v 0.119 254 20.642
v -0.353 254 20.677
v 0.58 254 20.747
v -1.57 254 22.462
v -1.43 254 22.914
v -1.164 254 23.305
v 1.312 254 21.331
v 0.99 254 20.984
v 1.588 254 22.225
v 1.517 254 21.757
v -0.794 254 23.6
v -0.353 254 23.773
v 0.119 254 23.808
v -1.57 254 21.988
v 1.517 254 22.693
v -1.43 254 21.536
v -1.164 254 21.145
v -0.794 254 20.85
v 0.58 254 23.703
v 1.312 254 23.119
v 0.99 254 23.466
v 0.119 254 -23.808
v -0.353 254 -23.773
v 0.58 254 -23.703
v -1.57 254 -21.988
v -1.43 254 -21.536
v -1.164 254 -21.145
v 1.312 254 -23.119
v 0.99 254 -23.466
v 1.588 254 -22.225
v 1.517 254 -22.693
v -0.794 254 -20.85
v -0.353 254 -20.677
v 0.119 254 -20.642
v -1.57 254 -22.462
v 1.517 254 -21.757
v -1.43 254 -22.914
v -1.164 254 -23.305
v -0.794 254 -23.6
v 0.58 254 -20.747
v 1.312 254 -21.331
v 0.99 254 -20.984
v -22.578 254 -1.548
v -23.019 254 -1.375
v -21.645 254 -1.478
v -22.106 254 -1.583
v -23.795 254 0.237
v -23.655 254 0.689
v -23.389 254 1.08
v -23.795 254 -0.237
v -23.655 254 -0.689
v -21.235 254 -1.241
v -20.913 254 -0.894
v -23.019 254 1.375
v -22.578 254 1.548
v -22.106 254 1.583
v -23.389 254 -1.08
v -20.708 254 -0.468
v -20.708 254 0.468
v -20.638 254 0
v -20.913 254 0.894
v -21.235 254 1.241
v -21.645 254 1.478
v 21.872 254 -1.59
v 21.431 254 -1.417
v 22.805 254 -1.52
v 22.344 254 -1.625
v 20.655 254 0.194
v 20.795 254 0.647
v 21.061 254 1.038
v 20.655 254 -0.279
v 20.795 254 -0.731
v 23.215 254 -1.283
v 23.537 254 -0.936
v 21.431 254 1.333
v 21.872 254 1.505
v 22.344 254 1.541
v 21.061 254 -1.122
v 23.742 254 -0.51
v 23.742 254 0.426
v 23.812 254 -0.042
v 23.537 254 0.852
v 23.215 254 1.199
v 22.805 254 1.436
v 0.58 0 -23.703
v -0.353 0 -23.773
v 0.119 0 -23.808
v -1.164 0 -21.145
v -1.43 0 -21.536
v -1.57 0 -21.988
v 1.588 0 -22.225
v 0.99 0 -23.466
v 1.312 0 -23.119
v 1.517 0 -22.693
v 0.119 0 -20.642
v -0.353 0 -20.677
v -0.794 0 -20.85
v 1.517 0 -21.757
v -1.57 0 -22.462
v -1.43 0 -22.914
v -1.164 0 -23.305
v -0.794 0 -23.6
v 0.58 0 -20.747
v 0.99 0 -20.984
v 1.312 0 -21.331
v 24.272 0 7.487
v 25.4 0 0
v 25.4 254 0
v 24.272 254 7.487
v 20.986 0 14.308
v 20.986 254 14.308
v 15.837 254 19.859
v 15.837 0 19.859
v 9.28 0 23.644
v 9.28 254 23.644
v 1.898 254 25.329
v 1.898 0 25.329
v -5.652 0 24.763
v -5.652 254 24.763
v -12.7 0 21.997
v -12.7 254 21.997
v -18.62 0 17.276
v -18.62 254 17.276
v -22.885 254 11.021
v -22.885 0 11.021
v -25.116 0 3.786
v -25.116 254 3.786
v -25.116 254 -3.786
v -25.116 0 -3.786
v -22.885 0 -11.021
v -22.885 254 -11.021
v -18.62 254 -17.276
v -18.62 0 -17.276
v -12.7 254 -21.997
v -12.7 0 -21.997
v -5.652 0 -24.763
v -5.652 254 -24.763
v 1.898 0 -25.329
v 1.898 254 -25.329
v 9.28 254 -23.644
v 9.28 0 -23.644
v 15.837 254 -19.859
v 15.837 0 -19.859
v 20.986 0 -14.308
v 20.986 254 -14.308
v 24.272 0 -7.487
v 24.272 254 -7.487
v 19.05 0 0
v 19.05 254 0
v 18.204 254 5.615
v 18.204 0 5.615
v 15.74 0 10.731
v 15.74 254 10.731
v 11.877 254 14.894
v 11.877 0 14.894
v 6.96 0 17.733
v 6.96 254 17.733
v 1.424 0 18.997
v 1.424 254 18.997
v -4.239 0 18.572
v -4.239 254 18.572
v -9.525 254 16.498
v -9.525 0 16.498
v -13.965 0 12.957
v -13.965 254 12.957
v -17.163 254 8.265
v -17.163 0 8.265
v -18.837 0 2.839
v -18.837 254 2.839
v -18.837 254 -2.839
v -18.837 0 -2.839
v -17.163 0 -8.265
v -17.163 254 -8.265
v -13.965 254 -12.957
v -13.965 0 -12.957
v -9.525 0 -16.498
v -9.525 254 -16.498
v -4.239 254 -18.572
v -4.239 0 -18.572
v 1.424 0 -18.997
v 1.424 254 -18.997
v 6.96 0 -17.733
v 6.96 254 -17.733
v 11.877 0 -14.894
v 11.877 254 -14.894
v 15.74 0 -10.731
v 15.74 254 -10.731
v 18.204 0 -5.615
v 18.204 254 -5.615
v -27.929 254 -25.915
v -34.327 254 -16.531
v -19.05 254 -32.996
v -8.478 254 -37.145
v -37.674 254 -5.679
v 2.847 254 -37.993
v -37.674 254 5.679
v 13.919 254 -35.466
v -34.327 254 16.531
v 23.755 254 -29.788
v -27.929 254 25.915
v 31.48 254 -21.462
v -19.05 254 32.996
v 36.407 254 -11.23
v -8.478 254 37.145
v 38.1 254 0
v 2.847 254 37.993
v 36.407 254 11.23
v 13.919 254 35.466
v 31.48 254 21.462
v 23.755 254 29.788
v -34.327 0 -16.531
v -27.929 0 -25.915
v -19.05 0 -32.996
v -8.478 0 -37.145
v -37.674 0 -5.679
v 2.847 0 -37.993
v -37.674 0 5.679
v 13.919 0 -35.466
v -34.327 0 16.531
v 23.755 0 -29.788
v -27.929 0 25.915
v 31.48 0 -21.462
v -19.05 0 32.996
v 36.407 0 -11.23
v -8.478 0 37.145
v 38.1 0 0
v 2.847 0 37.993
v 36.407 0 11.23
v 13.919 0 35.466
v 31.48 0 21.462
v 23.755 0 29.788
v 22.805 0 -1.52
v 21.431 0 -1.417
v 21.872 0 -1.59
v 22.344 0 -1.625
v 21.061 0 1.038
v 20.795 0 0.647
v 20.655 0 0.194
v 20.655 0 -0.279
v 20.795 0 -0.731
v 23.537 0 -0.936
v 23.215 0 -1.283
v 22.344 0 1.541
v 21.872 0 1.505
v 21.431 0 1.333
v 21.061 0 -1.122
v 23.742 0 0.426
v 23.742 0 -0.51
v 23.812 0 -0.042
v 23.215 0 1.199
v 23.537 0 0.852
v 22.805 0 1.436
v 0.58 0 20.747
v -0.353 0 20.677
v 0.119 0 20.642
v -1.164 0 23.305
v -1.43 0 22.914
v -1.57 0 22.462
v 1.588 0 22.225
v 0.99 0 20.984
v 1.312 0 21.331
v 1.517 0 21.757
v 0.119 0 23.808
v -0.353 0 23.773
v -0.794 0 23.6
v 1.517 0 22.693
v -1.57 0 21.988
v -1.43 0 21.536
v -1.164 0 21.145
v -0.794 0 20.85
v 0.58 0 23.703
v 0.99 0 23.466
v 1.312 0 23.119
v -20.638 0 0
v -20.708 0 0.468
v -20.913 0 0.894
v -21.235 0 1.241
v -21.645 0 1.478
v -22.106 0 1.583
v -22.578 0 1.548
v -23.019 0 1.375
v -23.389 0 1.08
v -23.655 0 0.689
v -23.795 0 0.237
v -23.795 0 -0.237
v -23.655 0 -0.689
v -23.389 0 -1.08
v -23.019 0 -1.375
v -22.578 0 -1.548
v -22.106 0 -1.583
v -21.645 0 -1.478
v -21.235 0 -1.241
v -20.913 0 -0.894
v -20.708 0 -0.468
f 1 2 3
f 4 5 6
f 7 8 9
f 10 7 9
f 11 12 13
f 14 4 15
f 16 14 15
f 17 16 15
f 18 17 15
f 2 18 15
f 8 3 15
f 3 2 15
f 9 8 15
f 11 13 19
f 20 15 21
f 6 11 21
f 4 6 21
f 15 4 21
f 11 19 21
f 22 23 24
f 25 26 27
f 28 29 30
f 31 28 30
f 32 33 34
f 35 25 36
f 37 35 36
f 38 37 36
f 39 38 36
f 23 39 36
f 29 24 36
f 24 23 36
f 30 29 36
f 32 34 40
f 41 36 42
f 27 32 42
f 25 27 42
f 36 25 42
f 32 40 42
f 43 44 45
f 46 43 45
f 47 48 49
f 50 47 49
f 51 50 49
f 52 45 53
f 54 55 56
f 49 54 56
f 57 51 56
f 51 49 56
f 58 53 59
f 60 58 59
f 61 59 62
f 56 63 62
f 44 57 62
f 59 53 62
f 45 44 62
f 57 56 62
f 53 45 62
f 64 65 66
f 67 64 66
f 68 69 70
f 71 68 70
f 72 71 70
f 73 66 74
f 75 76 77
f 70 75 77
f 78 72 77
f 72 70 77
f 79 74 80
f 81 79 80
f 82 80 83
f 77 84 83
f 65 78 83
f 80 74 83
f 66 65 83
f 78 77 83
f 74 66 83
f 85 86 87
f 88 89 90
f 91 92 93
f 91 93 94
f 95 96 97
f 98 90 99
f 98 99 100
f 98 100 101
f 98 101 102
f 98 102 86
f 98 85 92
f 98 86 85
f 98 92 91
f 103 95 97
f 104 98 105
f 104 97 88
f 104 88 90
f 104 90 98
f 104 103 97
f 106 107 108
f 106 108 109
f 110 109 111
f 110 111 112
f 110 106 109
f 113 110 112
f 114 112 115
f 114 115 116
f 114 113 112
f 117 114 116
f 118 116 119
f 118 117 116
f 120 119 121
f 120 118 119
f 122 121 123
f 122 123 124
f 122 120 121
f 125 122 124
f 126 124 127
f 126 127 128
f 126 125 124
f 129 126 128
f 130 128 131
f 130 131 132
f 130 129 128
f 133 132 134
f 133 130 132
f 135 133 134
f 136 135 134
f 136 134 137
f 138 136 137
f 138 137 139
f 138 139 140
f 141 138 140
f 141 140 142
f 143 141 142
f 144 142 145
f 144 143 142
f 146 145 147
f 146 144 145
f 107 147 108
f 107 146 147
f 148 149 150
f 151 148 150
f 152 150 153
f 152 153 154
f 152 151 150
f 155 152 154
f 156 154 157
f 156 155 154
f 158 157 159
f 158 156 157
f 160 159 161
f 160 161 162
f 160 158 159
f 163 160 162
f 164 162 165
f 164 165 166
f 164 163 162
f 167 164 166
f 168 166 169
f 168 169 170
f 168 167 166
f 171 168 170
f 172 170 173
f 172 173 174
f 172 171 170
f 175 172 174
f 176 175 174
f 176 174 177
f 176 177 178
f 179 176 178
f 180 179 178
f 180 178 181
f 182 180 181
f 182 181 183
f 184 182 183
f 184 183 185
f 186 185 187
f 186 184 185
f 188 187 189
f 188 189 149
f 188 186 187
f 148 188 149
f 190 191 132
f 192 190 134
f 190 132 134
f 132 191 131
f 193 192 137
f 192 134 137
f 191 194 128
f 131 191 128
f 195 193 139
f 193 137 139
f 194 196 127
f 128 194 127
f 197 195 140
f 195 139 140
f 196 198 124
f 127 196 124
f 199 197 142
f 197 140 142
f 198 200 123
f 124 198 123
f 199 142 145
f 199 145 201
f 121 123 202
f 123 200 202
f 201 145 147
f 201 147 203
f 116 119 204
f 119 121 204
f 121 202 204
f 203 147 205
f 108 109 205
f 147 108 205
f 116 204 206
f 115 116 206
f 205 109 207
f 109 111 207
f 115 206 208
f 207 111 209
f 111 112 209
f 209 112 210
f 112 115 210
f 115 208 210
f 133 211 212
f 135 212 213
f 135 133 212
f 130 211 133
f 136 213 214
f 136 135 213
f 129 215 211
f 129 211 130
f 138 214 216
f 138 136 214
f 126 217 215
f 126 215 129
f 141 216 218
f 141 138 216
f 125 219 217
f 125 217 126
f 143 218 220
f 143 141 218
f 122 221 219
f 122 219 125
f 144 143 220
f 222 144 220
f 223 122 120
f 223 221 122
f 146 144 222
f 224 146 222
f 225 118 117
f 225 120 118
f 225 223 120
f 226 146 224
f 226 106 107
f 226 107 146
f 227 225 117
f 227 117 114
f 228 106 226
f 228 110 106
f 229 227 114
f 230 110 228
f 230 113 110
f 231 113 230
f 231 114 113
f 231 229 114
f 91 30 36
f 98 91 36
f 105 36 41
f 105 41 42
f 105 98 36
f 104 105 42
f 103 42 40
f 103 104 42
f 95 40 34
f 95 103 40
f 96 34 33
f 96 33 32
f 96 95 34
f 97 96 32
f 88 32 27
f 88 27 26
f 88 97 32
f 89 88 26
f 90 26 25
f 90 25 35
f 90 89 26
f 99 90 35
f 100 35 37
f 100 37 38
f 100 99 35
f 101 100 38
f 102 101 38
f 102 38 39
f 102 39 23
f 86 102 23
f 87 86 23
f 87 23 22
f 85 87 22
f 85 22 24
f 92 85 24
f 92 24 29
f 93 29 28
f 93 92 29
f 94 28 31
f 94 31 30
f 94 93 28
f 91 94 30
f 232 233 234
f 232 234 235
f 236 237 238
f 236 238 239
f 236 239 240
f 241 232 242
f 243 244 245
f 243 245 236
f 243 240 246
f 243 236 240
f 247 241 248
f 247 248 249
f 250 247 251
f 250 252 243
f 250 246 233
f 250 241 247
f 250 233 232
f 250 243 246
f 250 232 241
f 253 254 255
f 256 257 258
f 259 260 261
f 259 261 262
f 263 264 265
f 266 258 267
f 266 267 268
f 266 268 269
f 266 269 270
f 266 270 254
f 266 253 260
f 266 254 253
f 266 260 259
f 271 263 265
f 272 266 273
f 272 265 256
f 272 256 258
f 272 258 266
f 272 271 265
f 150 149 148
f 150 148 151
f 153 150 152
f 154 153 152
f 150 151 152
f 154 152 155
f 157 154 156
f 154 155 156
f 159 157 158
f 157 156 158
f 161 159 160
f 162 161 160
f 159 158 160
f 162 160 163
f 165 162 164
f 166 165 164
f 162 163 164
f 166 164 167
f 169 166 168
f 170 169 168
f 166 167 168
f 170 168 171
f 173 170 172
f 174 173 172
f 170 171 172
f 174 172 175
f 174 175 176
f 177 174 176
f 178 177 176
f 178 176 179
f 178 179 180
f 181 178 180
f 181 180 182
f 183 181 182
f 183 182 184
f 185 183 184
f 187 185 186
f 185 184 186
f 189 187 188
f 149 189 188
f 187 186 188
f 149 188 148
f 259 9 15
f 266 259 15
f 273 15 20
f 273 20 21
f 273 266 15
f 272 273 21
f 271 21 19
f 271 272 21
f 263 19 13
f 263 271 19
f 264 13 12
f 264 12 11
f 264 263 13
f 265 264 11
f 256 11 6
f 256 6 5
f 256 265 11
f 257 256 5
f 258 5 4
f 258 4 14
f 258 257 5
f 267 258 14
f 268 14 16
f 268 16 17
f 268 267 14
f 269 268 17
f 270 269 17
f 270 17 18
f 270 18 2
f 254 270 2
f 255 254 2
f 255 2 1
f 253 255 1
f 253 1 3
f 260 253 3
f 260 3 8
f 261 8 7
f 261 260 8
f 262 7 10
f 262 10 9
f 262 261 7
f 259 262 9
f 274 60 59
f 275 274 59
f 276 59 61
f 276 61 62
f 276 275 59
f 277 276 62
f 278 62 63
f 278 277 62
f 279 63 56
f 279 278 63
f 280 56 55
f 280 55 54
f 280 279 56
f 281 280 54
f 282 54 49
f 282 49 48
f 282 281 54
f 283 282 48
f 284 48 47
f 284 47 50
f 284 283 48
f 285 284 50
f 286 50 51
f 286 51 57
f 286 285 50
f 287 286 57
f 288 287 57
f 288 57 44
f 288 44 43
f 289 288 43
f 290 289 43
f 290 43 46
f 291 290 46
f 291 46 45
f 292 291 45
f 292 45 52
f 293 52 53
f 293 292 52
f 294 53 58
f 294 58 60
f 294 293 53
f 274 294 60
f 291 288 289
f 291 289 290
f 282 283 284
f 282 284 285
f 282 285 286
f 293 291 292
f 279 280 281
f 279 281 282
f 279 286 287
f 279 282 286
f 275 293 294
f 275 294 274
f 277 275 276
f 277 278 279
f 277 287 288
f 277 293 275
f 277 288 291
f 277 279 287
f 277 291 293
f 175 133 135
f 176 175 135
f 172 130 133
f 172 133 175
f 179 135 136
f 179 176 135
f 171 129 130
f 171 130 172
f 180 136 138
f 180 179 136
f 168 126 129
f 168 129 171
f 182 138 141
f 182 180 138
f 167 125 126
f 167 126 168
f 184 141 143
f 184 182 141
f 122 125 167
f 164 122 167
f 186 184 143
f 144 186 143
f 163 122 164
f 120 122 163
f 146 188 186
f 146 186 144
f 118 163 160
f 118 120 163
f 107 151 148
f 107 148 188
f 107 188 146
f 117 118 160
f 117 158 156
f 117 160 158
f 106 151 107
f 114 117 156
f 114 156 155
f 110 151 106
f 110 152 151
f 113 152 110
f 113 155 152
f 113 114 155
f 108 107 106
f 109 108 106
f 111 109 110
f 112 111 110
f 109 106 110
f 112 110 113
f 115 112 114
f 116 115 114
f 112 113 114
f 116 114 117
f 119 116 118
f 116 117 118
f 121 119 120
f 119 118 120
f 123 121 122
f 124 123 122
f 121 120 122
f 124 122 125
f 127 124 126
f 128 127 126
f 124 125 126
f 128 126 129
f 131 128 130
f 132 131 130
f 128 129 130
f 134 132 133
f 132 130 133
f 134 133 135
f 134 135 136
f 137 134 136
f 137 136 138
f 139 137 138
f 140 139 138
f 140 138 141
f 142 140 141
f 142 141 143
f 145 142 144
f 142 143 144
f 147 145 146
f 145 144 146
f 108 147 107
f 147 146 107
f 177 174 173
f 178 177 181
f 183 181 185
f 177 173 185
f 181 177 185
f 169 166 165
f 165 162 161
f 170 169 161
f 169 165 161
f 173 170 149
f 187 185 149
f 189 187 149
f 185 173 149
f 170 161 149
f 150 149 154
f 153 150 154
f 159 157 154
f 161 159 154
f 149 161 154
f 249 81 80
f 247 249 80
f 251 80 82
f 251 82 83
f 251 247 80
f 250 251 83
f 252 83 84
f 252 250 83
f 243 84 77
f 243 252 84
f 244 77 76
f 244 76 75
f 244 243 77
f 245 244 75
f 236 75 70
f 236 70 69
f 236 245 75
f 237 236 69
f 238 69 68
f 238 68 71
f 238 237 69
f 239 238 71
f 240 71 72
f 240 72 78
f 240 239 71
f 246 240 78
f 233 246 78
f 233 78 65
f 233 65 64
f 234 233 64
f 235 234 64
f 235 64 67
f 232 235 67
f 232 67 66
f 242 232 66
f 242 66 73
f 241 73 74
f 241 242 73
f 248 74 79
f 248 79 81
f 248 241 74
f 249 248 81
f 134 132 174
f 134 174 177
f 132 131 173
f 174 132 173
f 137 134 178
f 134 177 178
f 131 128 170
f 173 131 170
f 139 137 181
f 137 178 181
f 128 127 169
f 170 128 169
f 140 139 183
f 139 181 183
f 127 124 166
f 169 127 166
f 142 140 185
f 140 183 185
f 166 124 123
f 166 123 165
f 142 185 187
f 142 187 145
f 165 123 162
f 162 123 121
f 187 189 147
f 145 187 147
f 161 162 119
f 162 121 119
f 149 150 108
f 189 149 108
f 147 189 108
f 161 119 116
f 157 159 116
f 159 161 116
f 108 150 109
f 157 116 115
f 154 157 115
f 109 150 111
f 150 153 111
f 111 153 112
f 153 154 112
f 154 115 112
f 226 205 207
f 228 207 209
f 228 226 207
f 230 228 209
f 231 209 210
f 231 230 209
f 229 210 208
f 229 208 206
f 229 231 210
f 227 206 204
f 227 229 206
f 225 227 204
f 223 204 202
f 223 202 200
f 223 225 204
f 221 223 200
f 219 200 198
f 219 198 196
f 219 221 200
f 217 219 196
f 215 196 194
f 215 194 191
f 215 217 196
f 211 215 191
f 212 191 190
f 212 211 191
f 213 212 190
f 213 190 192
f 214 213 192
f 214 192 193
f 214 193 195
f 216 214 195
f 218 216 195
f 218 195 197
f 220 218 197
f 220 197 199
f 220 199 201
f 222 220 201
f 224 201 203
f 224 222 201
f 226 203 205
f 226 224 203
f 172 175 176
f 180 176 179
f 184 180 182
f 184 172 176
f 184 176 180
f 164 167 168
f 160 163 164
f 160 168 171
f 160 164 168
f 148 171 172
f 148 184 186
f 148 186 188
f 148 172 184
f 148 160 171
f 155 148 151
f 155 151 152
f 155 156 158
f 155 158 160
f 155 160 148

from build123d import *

# Parameters (mm, degrees)
F2_R      = 38.1
F2_R_2    = 25.4
F4_DEPTH  = 254
F1_R      = 25.4
F1_R_2    = 19.05
F5_DEPTH  = 254
F6_START  = -25.4
F0_R      = 19.05
F6_DEPTH  = 228.6
F3_R      = 1.5875
F7_DEPTH  = 254
F8_DEPTH  = 254
F12_DEPTH = 254


with BuildPart() as f4:
    # F2 (on Front) → F4 (new body)
    with BuildSketch(Plane.XZ):
        Circle(F2_R)
        Circle(F2_R_2, mode=Mode.SUBTRACT)
    extrude(amount=-F4_DEPTH)


with BuildPart() as f5:
    # F1 (on Front) → F5 (new body)
    with BuildSketch(Plane.XZ):
        Circle(F1_R)
        Circle(F1_R_2, mode=Mode.SUBTRACT)
    extrude(amount=-F5_DEPTH)


with BuildPart() as f6:
    # F0 (on Front) → F6 (new body)
    with BuildSketch(Plane.XZ.offset(F6_START)):
        Circle(F0_R)
    extrude(amount=-F6_DEPTH)

    # F0 (on Front) → F8 (join)
    with BuildSketch(Plane.XZ):
        Circle(F0_R)
    extrude(amount=-F8_DEPTH)


with BuildPart() as f7:
    # F3 (on Front) → F7 (new body)
    with BuildSketch(Plane.XZ):
        with Locations((0, 22.225)):
            Circle(F3_R)
    extrude(amount=-F7_DEPTH)


with BuildPart() as f7b:
    # F3 (on Front) → F7, piece 2 (new body)
    with BuildSketch(Plane.XZ):
        with Locations((-22.225, 0)):
            Circle(F3_R)
    extrude(amount=-F7_DEPTH)


with BuildPart() as f7c:
    # F3 (on Front) → F7, piece 3 (new body)
    with BuildSketch(Plane.XZ):
        with Locations((22.225, -0.042203279)):
            Circle(F3_R)
    extrude(amount=-F7_DEPTH)


with BuildPart() as f7d:
    # F3 (on Front) → F7, piece 4 (new body)
    with BuildSketch(Plane.XZ):
        with Locations((0, -22.225)):
            Circle(F3_R)
    extrude(amount=-F7_DEPTH)


with BuildPart() as f10_1:
    # F10: copy of F7b
    add(f7b.part)


with BuildPart() as f12:
    # F0 (on Front) → F12 (new body)
    with BuildSketch(Plane.XZ):
        Circle(F0_R)
    extrude(amount=-F12_DEPTH)


solid = Compound([f4.part, f5.part, f7.part, f7b.part, f7c.part, f7d.part, f12.part])
